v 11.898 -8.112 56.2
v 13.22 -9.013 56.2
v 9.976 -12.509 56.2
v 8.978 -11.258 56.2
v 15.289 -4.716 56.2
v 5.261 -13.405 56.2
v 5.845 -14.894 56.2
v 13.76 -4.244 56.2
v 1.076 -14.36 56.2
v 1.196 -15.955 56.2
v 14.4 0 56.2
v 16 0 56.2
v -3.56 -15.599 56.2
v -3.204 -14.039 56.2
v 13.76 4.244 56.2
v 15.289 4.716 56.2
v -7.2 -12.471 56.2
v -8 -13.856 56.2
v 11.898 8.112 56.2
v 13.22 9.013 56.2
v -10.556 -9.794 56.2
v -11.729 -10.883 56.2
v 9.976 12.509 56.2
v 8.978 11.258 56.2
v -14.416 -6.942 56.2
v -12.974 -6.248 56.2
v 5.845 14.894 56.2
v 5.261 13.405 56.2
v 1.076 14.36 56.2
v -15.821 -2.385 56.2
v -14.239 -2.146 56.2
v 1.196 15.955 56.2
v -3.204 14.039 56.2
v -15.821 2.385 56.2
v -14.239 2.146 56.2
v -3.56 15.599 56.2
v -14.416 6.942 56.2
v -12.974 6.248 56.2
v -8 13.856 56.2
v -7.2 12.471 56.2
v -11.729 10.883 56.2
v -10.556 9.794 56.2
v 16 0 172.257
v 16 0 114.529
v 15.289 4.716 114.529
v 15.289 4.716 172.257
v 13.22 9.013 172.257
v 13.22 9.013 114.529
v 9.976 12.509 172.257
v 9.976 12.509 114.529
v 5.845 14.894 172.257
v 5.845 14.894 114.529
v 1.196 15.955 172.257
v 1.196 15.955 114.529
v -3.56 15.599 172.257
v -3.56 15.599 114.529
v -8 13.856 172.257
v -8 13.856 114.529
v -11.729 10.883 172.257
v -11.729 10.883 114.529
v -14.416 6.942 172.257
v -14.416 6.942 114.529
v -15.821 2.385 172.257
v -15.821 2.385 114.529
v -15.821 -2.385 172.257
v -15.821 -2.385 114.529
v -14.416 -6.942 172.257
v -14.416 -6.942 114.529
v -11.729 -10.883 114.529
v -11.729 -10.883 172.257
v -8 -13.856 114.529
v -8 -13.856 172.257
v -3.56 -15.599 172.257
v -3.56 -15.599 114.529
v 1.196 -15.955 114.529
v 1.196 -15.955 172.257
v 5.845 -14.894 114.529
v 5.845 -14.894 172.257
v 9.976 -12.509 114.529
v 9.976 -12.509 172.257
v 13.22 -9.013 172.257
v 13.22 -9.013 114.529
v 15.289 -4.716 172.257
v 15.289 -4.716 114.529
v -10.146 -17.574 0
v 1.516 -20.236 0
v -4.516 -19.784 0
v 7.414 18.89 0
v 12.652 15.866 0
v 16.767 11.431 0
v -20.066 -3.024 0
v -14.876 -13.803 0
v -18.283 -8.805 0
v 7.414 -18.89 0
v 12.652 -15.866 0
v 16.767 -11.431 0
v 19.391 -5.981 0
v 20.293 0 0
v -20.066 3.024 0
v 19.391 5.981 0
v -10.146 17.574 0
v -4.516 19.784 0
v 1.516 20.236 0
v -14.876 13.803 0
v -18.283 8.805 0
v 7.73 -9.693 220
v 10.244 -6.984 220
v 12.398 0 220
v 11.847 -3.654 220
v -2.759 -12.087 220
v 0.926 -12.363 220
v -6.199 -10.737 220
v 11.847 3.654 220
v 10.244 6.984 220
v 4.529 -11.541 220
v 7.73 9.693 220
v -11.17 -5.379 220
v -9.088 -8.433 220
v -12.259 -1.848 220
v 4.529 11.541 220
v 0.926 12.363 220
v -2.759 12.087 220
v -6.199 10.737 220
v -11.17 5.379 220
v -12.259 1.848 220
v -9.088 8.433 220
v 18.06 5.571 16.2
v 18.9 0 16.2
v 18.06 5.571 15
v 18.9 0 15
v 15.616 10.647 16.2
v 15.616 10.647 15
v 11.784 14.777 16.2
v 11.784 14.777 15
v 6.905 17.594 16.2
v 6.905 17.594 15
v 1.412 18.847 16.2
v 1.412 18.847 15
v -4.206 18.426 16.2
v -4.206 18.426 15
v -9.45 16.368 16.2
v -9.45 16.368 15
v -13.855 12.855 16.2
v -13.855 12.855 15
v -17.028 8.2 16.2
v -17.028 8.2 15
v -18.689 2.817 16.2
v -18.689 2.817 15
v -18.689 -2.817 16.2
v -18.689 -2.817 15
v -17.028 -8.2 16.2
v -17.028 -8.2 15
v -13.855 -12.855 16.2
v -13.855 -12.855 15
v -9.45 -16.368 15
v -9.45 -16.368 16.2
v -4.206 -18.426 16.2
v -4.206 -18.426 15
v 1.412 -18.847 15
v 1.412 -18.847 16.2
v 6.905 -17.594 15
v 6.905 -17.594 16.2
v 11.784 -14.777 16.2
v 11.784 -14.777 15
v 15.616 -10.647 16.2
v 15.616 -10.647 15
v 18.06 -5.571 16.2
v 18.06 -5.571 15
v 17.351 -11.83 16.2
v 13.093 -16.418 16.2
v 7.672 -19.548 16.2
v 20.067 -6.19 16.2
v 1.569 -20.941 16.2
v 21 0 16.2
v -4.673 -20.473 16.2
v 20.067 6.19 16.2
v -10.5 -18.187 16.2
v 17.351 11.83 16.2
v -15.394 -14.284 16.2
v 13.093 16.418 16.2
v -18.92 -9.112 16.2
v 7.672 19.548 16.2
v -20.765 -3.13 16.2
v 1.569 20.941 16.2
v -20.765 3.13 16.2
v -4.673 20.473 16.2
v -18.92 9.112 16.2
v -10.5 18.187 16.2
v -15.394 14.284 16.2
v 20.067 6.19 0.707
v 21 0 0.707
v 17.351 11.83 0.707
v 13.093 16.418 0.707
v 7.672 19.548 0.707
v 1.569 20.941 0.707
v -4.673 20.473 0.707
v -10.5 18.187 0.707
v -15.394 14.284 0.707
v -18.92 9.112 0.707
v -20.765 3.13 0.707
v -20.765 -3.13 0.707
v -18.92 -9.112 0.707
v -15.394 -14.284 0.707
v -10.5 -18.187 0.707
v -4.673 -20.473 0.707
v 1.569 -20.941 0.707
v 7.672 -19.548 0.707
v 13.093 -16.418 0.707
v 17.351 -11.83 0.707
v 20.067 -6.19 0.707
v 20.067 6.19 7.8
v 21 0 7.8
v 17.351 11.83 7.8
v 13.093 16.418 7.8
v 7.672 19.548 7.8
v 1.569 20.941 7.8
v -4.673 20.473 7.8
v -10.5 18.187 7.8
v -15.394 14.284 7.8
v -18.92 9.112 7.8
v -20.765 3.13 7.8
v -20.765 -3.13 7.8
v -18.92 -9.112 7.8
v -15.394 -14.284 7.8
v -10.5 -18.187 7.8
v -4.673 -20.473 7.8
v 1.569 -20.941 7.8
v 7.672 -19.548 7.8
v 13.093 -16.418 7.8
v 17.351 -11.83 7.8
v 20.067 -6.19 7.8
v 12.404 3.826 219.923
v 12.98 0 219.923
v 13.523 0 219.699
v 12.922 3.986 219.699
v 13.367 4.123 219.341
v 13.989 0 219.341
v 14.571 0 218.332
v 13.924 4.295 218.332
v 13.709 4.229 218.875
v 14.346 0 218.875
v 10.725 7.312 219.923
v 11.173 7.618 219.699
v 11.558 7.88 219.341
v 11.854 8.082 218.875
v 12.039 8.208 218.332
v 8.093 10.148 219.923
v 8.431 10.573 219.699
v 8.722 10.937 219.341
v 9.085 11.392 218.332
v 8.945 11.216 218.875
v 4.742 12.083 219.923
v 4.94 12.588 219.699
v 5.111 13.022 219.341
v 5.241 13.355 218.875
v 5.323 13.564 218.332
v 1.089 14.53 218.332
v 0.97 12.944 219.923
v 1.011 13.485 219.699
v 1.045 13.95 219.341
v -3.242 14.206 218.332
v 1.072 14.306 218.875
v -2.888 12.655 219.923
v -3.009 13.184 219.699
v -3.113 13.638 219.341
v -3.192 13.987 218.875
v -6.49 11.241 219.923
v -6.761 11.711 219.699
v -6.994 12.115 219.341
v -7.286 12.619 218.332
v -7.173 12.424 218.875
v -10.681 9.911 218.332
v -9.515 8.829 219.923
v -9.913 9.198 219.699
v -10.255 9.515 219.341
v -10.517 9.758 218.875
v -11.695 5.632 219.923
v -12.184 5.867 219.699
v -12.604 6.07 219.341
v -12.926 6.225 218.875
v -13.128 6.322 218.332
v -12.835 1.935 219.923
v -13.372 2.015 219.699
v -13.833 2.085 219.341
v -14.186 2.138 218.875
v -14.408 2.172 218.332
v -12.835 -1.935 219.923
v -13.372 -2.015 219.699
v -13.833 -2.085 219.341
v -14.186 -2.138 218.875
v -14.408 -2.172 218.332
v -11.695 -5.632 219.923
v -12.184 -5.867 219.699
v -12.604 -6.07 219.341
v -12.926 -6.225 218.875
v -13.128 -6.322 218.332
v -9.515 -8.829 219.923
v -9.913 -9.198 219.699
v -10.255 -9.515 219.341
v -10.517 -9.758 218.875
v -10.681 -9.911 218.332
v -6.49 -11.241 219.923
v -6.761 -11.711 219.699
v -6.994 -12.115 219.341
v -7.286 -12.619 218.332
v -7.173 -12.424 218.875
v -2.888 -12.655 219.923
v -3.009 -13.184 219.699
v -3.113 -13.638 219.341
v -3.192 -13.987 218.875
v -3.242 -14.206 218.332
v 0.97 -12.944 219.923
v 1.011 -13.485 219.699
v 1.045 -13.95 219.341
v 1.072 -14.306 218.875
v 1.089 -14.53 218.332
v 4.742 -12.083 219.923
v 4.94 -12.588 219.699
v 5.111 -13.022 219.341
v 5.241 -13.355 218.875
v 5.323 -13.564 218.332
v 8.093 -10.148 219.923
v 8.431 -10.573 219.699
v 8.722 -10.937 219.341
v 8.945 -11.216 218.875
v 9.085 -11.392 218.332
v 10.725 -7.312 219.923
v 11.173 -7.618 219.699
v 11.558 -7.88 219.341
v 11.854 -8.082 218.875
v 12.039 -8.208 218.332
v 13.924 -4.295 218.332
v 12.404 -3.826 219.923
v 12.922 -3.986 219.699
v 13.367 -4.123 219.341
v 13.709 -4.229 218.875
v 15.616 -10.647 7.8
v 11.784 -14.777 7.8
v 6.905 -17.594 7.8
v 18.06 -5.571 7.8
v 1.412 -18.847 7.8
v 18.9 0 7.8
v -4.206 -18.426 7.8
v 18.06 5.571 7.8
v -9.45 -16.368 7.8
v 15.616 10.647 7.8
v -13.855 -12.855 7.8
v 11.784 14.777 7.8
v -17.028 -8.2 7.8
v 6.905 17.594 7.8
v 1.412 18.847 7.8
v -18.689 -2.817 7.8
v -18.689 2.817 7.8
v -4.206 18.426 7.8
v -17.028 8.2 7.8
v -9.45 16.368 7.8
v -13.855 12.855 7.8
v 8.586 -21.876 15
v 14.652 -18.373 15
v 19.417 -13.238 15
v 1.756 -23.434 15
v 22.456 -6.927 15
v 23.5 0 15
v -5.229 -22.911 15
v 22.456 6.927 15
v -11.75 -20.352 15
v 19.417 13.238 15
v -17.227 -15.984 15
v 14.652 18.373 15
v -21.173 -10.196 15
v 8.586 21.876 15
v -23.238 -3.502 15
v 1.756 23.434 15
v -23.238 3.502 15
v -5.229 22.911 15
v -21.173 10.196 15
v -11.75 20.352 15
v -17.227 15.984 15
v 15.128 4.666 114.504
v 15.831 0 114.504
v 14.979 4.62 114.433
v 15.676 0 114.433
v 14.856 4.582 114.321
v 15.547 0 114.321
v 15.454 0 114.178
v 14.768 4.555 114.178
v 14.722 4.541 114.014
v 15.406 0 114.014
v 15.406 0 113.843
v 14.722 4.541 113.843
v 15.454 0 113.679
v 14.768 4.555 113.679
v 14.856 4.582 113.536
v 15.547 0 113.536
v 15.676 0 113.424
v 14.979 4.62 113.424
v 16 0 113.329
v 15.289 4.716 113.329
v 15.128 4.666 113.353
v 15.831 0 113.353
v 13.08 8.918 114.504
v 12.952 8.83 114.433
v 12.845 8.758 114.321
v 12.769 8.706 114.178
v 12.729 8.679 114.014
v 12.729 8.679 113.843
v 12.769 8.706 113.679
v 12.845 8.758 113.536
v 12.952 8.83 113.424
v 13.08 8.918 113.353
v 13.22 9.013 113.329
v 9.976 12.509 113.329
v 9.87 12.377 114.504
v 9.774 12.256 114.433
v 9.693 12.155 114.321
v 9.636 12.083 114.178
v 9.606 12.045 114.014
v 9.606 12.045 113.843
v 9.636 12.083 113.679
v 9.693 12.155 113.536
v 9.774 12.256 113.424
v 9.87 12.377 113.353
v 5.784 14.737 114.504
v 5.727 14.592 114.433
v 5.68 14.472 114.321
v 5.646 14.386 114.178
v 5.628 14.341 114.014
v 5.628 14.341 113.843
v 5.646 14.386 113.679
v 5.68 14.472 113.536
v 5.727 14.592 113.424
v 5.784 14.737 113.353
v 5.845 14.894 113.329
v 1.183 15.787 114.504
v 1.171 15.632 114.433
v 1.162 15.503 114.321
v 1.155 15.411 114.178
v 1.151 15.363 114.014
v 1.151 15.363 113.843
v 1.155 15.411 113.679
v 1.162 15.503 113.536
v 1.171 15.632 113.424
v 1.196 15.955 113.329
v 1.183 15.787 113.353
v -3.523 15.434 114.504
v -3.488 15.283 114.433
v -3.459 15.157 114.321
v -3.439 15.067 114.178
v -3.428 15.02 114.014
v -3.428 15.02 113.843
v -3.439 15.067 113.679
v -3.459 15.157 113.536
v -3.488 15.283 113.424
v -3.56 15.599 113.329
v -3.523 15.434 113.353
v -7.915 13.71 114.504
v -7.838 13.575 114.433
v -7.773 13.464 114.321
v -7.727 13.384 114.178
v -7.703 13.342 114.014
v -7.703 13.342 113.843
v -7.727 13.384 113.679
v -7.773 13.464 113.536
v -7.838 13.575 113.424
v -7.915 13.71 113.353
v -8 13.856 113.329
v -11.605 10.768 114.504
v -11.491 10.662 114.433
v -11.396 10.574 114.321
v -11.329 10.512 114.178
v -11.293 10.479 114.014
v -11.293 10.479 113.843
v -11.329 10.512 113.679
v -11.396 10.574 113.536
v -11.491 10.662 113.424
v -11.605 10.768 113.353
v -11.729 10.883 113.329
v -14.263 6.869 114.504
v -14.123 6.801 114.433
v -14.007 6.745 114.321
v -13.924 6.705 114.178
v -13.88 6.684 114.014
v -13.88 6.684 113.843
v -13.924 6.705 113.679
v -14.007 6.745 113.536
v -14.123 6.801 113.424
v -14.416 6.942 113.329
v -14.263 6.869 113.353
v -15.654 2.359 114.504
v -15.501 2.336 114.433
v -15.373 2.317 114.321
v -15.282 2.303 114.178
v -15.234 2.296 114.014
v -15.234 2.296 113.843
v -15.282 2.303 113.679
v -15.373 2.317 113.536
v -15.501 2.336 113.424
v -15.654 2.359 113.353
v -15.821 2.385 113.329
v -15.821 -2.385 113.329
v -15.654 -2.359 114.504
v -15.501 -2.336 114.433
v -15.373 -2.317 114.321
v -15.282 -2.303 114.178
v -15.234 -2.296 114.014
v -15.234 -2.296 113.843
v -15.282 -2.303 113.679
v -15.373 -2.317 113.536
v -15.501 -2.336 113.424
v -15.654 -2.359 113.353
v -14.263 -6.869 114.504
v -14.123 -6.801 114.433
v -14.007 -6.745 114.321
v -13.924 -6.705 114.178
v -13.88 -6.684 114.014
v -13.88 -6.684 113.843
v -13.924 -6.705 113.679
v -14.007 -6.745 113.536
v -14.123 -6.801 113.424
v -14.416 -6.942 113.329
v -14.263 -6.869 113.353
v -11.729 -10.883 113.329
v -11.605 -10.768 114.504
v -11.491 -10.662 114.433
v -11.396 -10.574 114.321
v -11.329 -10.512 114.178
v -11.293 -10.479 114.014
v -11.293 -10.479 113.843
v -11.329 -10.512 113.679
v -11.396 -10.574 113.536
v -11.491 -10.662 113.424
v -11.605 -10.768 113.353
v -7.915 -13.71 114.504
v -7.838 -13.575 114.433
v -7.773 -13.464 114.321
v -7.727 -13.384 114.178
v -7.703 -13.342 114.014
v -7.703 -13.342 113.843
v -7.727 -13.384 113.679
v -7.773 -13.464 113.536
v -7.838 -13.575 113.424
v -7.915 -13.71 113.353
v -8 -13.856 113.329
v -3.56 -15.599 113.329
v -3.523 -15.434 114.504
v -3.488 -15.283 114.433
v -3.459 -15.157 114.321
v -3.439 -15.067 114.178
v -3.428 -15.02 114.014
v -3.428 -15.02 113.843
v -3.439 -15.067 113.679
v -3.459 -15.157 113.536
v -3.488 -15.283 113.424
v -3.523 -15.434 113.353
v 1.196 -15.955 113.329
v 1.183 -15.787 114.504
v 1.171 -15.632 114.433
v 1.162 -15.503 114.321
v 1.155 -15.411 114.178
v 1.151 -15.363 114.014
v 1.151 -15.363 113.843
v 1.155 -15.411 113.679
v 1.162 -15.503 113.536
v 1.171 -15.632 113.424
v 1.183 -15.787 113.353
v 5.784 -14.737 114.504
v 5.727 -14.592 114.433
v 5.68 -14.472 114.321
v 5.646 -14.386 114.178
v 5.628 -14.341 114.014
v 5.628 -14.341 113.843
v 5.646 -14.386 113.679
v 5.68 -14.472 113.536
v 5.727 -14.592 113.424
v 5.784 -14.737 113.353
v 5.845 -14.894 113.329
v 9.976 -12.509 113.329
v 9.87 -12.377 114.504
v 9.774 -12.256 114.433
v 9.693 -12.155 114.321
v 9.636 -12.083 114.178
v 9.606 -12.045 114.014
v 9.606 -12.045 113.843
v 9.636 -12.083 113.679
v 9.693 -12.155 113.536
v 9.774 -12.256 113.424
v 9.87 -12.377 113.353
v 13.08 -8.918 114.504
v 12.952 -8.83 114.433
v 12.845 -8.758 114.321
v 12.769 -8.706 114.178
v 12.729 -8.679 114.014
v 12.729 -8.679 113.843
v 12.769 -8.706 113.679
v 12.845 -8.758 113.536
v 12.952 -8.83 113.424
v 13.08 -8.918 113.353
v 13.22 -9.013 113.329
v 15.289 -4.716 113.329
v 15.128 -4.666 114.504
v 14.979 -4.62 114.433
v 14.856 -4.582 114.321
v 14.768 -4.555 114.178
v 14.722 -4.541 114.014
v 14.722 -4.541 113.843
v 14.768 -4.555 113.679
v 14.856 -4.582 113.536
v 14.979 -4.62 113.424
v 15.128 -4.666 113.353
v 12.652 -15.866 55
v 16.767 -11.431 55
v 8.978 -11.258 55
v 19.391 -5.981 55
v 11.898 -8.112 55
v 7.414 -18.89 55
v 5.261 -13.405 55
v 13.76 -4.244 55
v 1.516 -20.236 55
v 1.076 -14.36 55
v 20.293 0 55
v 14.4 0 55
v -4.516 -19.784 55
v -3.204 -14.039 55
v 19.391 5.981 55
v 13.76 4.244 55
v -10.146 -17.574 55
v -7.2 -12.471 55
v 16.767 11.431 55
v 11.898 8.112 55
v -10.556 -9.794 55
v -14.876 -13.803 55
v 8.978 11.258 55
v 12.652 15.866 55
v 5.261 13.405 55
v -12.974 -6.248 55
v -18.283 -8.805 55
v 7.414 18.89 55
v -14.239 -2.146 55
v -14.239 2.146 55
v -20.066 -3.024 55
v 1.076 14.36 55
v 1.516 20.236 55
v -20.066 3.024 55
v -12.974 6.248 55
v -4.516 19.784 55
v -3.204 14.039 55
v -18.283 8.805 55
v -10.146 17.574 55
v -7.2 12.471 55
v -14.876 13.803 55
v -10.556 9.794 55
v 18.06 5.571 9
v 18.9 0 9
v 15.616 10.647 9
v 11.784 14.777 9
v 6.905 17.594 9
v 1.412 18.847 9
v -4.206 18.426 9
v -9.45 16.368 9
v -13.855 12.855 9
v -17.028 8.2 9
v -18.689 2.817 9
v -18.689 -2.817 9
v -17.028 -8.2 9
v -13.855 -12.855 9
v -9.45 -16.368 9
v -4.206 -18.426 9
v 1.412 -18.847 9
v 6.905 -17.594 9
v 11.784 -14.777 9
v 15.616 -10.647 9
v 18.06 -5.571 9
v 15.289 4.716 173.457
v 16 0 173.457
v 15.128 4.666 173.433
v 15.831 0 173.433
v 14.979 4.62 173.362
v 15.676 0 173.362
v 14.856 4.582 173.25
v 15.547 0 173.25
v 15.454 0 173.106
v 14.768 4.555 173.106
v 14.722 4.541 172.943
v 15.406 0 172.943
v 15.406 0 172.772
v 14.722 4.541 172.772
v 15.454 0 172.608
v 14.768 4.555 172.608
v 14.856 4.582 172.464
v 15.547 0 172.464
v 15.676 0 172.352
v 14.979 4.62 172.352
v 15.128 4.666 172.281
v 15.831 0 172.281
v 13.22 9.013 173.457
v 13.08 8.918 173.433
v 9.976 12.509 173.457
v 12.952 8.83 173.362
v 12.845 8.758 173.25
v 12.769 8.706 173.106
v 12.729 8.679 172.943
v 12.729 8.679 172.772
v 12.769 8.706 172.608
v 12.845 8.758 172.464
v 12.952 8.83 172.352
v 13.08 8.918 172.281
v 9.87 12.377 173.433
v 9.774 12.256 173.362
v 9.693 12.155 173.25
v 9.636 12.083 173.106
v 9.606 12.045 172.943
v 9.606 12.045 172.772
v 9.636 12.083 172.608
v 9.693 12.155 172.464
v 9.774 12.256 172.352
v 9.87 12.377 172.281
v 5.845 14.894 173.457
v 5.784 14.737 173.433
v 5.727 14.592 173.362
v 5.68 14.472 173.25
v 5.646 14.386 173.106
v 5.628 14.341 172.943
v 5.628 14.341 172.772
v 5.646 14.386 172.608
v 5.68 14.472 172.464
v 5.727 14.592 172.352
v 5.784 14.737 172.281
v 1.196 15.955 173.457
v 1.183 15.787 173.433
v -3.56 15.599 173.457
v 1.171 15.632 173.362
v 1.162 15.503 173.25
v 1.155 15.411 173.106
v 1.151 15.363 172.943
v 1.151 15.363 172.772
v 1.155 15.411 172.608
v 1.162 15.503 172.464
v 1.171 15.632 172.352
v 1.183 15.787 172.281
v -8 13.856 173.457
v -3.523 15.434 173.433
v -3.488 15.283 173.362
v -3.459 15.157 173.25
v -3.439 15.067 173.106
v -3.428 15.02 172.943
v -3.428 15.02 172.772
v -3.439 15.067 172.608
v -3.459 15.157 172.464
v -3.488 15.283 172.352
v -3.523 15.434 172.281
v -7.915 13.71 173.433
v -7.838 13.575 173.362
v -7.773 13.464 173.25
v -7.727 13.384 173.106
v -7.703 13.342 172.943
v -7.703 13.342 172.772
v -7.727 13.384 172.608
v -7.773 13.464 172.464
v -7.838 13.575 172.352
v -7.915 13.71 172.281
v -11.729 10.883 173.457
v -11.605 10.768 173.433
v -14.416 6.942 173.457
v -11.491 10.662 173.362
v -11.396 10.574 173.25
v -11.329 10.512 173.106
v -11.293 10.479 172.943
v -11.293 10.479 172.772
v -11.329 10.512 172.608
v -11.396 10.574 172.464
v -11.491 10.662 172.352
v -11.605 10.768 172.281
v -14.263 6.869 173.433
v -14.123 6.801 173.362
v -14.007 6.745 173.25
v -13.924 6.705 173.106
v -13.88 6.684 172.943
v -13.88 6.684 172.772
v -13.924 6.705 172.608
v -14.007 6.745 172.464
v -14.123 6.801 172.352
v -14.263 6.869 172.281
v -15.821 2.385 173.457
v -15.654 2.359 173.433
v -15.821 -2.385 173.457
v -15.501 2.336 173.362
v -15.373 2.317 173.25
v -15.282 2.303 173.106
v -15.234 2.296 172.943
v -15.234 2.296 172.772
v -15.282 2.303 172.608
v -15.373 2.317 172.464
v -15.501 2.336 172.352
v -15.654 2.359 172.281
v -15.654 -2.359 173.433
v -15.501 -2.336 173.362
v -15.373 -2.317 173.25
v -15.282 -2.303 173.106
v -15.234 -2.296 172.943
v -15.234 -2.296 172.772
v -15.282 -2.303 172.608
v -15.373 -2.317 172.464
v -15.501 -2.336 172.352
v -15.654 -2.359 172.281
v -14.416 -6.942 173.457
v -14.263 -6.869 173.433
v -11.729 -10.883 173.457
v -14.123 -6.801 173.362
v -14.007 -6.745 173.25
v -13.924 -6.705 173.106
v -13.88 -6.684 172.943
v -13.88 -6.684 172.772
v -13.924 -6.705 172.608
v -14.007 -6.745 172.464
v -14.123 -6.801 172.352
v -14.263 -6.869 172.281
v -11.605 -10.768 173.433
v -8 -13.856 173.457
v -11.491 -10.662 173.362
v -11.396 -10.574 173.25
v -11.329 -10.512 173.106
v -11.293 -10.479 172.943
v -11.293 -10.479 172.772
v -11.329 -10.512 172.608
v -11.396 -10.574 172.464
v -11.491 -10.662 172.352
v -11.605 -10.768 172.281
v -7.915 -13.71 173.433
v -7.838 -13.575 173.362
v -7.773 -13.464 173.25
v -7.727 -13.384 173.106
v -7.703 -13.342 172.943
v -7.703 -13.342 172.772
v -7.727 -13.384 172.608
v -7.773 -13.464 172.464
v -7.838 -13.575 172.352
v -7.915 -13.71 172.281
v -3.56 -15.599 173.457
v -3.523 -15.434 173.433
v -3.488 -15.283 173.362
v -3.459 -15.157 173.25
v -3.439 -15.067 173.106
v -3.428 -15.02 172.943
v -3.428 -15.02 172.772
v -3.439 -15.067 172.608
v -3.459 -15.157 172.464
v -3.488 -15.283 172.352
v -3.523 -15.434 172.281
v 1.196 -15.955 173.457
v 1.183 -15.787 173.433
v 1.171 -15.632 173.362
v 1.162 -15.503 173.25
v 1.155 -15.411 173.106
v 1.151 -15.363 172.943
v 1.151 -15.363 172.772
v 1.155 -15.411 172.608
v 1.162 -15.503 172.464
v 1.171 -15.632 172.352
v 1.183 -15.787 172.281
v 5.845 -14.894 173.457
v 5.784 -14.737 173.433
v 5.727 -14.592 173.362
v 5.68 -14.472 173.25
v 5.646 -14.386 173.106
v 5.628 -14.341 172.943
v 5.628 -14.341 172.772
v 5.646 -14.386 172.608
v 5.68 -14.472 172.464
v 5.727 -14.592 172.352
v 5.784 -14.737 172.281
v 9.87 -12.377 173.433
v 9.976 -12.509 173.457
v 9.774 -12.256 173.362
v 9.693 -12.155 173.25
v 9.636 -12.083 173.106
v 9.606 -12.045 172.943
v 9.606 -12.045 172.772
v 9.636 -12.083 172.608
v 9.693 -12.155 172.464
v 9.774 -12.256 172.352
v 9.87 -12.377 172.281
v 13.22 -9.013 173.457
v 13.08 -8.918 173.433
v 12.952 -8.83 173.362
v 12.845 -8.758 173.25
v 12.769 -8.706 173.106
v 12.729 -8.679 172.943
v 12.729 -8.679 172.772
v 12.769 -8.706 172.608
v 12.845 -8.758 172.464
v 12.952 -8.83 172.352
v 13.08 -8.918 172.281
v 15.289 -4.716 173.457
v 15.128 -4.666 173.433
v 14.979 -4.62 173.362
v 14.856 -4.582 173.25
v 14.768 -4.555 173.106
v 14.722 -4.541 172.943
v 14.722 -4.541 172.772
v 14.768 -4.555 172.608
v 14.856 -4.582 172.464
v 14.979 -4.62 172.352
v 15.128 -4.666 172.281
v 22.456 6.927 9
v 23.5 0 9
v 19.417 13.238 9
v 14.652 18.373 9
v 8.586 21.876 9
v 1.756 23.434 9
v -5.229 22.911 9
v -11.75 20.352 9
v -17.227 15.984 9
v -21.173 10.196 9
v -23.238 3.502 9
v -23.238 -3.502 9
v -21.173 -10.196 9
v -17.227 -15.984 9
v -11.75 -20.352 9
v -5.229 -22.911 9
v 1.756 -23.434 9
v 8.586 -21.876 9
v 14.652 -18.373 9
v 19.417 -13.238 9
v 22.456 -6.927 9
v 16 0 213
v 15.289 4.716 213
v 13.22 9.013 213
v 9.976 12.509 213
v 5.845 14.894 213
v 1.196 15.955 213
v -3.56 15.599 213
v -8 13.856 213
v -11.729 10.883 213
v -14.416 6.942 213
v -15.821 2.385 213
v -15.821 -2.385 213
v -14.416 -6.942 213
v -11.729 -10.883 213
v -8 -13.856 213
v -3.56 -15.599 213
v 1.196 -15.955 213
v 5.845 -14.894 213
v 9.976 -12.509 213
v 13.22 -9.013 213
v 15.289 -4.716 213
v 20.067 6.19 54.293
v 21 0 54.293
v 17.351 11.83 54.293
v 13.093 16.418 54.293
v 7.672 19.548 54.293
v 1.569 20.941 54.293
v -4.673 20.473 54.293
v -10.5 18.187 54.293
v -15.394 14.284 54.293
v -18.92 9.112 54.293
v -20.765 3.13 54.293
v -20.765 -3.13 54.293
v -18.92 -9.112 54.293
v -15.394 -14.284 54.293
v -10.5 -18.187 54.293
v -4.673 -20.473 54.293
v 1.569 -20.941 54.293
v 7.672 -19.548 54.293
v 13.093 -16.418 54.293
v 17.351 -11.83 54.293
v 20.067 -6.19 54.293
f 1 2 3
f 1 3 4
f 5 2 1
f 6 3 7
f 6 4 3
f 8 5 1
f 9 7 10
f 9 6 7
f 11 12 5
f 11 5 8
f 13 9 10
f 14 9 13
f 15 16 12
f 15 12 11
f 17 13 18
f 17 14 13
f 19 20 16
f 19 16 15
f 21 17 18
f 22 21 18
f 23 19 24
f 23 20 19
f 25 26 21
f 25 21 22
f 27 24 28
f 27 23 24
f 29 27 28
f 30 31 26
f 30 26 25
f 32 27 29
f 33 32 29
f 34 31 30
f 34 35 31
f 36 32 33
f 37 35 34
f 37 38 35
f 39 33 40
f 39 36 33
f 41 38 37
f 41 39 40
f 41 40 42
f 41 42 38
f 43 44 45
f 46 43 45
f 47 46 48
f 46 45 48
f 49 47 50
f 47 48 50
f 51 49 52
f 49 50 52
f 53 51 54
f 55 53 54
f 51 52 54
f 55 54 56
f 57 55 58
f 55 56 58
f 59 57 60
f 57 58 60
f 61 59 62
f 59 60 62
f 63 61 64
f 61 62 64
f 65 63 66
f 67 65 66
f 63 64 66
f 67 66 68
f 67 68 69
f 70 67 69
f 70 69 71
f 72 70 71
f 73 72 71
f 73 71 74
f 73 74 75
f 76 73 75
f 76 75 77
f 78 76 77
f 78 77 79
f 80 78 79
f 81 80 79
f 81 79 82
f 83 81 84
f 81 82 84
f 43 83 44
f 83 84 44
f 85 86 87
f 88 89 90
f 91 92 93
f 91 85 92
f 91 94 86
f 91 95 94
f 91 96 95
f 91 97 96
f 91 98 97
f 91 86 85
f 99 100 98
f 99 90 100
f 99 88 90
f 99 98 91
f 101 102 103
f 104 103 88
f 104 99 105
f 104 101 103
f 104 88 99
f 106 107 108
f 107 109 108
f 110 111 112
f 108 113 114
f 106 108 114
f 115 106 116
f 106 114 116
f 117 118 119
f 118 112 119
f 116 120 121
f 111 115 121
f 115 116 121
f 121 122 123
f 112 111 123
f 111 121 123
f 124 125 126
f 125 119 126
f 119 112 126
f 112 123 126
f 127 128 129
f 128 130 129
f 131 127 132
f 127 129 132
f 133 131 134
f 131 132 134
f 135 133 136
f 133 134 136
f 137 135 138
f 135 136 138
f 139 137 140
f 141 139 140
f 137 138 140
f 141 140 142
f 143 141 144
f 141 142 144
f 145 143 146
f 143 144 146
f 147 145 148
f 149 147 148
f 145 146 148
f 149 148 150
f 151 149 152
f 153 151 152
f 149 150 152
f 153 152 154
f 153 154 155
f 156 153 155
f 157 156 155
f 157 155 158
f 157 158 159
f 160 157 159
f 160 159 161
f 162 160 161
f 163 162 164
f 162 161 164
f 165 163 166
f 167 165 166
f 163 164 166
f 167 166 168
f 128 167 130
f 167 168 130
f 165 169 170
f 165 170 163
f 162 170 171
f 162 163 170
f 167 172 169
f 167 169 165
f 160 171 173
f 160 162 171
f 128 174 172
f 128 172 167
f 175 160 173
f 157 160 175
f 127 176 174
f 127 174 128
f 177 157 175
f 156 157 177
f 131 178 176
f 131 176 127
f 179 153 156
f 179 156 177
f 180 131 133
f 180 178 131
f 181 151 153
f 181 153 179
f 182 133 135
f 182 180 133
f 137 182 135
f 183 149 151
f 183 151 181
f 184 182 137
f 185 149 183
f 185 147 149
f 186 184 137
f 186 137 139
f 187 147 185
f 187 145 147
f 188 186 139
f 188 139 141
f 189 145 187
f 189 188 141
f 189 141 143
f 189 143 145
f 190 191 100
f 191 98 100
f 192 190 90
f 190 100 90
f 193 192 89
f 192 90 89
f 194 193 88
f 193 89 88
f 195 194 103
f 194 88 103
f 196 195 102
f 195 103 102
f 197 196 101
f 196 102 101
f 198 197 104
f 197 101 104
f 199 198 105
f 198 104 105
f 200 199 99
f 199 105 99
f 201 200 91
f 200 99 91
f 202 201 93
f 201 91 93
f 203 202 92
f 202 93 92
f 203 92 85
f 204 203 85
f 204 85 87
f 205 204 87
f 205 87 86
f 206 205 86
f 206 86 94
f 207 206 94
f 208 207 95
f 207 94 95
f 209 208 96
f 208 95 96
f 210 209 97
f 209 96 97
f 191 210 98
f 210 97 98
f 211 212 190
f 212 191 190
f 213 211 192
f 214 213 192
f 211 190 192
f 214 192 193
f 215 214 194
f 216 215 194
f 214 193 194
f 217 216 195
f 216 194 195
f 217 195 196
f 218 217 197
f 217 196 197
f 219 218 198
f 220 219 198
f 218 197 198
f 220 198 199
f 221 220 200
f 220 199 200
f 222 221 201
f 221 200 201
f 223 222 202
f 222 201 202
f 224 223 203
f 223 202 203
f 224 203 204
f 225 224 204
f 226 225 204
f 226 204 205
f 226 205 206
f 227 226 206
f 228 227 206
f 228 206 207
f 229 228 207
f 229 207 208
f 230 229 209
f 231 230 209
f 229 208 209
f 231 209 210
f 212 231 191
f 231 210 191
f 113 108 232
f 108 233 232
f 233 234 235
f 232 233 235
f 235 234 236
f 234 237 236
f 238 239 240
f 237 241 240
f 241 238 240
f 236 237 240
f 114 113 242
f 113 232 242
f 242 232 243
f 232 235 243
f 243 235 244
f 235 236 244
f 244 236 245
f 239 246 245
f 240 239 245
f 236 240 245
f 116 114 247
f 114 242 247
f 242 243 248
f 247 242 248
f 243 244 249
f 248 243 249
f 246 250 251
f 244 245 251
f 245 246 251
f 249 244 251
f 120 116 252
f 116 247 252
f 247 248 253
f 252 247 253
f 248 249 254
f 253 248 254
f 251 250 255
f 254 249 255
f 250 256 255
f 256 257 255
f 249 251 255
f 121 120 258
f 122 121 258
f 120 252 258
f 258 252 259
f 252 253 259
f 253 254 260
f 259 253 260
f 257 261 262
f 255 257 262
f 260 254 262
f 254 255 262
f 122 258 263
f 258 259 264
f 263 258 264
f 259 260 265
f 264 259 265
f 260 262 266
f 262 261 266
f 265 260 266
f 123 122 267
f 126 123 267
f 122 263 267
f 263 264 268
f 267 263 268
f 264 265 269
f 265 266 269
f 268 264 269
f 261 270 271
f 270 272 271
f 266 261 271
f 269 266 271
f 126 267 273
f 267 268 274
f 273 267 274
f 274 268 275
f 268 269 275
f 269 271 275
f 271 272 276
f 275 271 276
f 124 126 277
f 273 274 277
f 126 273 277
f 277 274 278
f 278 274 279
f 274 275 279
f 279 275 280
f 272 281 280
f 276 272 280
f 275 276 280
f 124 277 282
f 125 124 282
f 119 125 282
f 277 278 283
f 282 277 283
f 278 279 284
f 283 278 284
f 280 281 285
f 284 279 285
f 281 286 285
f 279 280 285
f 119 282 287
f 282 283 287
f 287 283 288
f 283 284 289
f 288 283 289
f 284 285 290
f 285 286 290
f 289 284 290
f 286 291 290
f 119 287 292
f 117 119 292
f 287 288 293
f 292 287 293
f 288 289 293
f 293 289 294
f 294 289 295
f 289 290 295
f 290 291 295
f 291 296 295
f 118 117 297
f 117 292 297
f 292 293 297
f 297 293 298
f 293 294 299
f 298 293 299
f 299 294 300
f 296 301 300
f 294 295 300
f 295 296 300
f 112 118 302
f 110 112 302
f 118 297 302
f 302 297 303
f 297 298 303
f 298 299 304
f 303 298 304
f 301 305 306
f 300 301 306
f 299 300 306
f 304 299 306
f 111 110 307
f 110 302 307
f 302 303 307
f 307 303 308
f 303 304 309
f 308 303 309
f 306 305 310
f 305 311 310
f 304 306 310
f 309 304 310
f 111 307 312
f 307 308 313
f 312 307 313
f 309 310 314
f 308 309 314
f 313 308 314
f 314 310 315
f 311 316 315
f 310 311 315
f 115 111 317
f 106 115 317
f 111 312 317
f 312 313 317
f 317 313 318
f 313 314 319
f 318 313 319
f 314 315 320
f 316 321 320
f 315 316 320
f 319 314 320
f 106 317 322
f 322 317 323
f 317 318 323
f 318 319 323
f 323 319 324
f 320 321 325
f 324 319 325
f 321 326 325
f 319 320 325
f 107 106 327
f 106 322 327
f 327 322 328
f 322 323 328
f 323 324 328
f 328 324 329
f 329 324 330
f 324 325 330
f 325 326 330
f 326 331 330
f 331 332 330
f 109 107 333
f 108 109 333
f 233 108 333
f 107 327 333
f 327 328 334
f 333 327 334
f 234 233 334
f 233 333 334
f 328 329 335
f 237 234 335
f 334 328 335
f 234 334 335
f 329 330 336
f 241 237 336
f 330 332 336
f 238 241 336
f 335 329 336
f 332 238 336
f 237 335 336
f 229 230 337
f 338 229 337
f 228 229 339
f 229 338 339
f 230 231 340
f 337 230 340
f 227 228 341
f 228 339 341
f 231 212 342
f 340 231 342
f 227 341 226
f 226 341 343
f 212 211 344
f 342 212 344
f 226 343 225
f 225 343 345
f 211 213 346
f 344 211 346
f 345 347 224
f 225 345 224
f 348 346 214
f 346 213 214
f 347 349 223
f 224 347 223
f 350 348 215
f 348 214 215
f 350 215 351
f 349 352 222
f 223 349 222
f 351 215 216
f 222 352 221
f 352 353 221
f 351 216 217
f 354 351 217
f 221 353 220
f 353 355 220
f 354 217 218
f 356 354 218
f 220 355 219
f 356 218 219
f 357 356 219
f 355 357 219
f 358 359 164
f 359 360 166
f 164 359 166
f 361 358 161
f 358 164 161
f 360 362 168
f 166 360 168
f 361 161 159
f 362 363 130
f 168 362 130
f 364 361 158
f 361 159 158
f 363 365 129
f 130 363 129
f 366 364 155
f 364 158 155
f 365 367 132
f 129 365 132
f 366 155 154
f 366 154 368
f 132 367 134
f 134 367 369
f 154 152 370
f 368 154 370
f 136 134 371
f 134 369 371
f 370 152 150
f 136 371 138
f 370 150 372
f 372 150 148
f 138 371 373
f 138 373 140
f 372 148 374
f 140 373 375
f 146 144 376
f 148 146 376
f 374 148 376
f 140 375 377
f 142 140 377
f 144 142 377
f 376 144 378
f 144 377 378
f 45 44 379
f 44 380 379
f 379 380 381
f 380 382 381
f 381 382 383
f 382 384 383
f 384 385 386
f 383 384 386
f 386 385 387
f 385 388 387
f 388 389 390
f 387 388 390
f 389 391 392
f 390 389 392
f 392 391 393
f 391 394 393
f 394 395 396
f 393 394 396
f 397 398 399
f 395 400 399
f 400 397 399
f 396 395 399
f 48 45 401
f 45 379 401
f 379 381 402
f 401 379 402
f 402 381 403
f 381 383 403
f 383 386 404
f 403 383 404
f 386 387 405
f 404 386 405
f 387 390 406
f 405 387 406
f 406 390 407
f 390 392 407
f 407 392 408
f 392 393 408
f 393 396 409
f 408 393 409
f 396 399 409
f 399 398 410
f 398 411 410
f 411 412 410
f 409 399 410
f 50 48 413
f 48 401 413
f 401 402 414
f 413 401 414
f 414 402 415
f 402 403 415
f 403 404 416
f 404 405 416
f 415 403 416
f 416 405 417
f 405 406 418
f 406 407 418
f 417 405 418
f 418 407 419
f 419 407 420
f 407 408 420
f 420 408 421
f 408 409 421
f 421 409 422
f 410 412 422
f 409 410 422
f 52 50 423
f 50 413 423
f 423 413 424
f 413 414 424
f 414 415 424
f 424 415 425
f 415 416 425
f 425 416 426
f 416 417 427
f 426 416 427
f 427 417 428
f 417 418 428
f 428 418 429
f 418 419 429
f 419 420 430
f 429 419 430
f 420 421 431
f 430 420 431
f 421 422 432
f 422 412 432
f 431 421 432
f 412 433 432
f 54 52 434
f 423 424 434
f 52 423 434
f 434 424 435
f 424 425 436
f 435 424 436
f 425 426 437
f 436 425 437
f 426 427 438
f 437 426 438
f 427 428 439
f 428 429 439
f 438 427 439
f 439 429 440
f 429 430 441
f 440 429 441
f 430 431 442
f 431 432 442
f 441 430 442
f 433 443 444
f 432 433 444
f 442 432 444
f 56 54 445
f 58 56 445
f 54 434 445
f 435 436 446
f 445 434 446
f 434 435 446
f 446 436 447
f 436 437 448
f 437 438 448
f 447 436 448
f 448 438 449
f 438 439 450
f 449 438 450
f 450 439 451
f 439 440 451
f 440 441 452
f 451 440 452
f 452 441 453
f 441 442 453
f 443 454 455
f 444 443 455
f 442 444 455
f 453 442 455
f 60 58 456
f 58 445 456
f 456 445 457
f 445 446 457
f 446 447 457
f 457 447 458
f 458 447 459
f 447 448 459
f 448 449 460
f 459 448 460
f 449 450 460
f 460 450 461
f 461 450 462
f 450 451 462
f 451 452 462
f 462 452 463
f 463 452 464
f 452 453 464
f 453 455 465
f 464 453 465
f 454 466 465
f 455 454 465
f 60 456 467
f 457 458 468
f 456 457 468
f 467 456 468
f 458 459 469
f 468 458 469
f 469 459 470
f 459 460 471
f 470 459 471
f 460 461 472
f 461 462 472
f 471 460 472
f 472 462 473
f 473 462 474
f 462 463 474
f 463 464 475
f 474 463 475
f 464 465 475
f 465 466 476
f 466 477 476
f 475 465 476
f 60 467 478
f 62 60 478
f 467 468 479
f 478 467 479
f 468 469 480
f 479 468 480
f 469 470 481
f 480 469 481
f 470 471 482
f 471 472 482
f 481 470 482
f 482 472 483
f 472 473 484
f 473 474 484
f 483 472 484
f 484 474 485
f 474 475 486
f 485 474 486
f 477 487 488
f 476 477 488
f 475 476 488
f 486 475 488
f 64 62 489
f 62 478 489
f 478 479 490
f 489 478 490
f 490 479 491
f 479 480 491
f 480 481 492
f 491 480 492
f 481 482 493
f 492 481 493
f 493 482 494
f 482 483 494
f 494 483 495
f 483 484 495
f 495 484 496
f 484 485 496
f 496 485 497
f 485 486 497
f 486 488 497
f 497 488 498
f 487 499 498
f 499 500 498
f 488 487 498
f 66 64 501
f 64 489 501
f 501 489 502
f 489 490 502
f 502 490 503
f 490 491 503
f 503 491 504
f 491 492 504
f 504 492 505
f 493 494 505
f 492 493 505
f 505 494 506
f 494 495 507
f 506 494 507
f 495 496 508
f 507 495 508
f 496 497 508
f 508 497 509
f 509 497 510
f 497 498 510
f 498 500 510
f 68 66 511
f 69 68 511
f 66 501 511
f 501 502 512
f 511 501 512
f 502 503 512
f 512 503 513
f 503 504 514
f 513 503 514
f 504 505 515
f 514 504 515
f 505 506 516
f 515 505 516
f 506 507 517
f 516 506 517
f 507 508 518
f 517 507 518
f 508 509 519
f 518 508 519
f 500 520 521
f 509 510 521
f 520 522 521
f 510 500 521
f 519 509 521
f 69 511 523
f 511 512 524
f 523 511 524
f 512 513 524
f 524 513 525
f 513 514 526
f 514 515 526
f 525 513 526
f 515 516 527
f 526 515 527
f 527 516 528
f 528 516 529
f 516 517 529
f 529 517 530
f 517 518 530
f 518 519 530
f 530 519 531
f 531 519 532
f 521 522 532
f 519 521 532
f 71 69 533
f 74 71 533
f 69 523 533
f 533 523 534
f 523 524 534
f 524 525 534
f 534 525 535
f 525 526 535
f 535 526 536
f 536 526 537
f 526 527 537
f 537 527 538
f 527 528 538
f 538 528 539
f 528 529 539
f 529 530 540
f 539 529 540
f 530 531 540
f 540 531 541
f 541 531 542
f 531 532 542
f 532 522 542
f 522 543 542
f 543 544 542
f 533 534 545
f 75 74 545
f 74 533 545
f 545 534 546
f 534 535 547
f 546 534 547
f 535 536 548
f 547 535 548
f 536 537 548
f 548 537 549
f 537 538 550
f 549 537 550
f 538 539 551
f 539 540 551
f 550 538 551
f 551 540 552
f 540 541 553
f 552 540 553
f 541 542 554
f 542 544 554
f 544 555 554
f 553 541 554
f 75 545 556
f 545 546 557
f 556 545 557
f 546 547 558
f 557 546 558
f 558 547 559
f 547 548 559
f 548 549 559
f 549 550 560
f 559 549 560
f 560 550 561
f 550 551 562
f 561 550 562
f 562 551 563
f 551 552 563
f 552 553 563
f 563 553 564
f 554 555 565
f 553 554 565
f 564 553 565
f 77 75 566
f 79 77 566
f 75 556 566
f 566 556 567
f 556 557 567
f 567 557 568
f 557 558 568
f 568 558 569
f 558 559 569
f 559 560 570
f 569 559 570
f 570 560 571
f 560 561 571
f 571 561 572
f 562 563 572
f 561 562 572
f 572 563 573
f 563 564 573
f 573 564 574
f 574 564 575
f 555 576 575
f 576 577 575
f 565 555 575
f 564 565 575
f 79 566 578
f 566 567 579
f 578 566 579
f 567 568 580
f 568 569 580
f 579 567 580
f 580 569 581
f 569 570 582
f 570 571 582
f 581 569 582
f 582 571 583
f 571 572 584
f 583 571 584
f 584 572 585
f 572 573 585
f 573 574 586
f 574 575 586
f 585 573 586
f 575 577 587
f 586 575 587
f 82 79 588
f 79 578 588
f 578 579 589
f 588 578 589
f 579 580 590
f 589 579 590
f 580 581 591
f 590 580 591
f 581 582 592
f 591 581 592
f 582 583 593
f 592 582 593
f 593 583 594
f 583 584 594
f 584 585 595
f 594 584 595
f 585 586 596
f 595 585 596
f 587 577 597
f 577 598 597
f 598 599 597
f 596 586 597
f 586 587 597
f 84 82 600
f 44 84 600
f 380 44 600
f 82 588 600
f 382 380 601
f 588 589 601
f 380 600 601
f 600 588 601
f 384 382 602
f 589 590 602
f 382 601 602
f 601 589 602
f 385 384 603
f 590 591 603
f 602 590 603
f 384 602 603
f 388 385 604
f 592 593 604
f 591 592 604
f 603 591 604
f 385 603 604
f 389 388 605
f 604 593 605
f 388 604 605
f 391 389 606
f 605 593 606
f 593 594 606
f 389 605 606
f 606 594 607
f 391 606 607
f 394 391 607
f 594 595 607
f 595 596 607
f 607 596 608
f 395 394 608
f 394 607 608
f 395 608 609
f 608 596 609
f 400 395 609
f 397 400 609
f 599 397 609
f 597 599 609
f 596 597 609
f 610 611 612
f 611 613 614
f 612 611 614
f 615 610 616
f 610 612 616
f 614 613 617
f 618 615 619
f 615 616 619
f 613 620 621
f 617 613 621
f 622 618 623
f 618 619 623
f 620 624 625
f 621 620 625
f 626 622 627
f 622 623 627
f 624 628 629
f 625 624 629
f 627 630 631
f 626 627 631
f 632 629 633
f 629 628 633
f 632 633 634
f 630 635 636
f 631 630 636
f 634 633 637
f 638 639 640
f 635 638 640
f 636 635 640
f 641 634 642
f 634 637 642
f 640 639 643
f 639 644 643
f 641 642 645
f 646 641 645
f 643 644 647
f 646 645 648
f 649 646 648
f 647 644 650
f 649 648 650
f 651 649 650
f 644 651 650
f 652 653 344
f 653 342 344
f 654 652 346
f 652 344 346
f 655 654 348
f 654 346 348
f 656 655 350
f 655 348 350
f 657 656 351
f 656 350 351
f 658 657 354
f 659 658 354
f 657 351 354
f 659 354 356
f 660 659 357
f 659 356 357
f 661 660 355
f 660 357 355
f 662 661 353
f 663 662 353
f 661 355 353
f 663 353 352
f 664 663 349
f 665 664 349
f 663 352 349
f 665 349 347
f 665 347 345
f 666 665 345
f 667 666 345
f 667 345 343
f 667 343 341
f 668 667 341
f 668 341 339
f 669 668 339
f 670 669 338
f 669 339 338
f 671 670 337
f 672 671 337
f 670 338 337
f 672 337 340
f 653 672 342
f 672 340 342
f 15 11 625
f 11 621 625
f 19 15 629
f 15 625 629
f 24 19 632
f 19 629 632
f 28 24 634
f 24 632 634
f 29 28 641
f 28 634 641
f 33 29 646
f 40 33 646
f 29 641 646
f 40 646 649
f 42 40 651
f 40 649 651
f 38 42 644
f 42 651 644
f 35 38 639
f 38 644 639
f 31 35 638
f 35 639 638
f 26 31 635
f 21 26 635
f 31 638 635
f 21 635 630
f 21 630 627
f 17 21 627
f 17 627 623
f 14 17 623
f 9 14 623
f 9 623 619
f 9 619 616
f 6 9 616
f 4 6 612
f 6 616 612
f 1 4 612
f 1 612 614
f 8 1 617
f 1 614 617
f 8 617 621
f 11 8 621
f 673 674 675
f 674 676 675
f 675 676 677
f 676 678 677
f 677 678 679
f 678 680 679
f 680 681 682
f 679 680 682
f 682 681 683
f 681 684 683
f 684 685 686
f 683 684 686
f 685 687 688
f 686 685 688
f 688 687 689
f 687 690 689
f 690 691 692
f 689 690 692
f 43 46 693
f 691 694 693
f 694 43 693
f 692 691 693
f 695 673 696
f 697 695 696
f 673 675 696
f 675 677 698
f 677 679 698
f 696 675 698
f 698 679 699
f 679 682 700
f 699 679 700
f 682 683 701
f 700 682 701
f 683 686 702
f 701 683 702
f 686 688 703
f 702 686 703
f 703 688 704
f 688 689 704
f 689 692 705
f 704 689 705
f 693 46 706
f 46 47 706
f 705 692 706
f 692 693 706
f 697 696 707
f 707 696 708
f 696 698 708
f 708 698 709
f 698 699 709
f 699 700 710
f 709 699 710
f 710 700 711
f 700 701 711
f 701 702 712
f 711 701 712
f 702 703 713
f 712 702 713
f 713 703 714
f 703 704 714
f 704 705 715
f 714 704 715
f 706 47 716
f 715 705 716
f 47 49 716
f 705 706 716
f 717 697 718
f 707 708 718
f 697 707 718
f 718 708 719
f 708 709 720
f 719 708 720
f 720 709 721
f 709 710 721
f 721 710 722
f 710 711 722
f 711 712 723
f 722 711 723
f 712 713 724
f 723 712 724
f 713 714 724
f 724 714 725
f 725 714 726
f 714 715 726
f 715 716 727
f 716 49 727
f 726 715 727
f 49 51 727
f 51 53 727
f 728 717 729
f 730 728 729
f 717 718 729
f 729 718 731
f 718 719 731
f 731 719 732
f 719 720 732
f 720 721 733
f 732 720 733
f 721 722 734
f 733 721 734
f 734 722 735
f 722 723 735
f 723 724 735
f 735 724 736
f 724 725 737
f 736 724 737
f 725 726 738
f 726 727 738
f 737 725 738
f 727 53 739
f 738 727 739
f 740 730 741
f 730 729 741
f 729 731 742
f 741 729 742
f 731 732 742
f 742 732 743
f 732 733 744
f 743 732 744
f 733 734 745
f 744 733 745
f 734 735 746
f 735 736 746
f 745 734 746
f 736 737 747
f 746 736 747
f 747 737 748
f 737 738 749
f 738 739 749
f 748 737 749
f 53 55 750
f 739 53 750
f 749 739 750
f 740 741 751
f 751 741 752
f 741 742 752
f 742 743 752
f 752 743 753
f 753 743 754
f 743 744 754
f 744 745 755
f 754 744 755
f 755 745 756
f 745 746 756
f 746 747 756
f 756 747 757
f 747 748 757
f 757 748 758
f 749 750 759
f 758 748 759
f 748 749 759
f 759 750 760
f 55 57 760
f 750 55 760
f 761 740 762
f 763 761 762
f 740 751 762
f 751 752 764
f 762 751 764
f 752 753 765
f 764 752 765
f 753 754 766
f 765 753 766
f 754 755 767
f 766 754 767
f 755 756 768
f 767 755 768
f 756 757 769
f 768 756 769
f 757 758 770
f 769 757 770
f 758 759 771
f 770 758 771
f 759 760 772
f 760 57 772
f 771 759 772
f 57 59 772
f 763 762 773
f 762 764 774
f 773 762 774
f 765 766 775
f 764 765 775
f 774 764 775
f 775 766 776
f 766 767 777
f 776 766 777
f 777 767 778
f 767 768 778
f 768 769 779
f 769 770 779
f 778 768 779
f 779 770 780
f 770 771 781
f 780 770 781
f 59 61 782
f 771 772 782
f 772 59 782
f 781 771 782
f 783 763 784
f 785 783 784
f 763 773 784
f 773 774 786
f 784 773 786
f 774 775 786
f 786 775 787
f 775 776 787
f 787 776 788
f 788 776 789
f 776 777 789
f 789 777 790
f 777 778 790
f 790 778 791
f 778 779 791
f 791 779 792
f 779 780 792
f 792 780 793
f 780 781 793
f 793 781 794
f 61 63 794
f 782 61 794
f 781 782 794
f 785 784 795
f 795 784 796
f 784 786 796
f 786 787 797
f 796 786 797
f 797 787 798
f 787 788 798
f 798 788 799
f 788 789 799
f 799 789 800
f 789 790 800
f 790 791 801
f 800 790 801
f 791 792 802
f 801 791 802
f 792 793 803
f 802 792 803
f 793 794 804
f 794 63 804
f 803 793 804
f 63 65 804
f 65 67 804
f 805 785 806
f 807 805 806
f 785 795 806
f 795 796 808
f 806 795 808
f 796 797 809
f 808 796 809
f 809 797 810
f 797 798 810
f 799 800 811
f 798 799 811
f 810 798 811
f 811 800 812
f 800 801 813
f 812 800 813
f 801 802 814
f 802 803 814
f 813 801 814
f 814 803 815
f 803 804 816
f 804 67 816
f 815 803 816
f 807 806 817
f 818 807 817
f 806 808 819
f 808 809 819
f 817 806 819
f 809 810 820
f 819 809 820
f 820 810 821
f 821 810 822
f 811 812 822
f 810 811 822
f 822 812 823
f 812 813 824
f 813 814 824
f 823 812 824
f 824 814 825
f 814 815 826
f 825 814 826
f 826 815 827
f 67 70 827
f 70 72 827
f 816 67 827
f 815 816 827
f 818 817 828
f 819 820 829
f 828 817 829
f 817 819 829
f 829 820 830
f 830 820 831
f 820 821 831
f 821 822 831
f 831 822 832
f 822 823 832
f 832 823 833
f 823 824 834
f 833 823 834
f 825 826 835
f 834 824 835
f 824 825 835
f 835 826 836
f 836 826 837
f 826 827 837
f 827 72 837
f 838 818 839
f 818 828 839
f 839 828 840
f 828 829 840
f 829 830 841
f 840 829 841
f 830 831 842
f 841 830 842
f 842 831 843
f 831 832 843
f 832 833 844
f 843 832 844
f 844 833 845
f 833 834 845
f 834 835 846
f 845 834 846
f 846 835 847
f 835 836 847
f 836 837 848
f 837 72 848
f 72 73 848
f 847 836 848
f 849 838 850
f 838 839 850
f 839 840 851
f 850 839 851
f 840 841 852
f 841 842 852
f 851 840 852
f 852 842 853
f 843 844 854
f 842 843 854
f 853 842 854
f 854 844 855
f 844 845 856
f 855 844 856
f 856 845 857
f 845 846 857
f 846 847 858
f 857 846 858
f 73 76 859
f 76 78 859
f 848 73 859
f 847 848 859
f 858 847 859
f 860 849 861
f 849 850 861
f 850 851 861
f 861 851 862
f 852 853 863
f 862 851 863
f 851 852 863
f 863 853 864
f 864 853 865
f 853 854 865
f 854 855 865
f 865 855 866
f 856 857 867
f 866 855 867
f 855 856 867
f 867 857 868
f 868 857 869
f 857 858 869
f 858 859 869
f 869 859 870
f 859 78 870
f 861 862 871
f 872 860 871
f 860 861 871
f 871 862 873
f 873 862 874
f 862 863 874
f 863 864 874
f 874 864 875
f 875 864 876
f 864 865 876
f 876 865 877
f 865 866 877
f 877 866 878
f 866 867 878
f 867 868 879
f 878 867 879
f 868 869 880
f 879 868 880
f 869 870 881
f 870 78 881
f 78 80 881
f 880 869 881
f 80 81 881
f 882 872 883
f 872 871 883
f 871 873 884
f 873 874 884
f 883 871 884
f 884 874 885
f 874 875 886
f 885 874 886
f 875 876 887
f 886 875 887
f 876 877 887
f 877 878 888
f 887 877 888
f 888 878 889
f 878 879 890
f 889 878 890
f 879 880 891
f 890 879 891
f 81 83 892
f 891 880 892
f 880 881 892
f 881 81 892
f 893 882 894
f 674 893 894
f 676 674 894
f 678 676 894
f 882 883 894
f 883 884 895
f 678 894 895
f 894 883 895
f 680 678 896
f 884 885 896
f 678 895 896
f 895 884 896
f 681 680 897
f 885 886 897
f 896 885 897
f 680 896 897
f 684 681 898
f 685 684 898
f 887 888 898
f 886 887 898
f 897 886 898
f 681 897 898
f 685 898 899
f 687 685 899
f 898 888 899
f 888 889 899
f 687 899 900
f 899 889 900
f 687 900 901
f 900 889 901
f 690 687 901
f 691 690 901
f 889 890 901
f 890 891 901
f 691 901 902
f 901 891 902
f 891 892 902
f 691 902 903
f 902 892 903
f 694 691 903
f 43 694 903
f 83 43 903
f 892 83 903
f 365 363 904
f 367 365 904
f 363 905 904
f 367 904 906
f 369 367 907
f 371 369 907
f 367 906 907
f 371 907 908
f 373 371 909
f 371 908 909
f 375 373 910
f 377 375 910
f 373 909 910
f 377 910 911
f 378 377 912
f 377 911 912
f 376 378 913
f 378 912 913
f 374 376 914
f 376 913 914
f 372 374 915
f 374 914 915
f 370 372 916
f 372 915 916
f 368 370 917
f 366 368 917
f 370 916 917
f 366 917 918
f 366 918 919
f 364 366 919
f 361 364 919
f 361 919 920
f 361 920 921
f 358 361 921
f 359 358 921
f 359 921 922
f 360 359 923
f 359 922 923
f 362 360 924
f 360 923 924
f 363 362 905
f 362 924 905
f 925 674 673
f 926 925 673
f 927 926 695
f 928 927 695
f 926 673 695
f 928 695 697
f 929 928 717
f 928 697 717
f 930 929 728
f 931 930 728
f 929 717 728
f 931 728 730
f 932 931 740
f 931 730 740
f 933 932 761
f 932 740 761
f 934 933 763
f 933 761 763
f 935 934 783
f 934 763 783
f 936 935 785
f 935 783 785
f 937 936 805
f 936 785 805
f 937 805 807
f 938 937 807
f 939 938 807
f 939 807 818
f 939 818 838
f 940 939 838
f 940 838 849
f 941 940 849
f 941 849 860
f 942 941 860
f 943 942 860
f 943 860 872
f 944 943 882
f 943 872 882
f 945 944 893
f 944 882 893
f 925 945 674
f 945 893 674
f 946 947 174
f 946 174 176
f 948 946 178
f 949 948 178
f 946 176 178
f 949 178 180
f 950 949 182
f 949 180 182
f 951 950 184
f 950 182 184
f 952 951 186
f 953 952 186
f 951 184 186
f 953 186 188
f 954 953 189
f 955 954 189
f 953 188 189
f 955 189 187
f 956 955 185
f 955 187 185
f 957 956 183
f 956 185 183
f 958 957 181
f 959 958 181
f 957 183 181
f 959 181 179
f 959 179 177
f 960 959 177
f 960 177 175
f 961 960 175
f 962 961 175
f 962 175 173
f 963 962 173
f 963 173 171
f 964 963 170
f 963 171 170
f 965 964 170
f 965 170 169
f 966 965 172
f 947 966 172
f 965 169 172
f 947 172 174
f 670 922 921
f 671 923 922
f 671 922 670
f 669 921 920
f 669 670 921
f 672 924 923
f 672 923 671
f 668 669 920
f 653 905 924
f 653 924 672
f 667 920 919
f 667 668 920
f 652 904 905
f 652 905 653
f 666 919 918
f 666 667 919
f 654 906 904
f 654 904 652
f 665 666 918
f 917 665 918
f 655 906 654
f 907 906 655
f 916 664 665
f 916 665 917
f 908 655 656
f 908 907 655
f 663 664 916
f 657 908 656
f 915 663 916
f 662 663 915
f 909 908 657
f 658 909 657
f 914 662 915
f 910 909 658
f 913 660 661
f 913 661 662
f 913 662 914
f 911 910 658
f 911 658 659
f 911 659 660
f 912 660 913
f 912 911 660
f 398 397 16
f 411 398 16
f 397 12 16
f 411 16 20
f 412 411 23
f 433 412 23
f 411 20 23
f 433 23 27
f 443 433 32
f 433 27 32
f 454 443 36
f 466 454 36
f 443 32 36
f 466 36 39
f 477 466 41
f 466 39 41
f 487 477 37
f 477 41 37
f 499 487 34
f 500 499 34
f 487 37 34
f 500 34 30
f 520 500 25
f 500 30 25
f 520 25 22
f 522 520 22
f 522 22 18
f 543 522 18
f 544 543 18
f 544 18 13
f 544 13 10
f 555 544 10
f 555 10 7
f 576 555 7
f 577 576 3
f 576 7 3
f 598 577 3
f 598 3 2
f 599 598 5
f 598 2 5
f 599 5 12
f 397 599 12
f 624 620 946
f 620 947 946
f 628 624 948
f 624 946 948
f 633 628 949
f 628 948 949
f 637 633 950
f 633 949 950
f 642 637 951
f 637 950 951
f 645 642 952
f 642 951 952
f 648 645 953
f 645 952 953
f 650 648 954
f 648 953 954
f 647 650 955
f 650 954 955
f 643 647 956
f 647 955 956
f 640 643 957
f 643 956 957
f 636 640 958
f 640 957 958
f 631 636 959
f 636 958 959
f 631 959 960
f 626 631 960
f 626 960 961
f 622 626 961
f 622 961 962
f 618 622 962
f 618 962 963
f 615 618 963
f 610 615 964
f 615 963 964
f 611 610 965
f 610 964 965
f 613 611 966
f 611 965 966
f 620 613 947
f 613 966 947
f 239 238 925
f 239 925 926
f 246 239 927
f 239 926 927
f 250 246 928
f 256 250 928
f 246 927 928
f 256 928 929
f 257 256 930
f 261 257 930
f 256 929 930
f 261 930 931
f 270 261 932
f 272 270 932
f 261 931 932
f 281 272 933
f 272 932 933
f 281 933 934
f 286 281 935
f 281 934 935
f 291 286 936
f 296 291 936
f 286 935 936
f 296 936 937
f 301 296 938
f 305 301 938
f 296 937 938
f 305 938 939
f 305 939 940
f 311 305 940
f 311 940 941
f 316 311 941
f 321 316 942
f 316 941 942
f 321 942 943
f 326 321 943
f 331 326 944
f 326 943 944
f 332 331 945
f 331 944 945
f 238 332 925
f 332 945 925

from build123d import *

# Parameters (mm, degrees)
SZKIC1_W = 9
SZKIC1_H = 21
SZKIC3_W = 1.2
SZKIC3_H = 2.1
SZKIC4_W = 6
SZKIC4_H = 23.5
SZKIC5_W = 40
SZKIC5_H = 21
SZKIC6_W = 1.2
SZKIC6_H = 2.1
SZKIC8_W = 165
SZKIC8_H = 16
SZKIC9_W = 1.2
SZKIC9_H = 1.6


with BuildPart() as part:
    # Szkic1 → Obrót1 (revolve)
    with BuildSketch(Plane(origin=(0, 0, 0), x_dir=(0, 0, -1), z_dir=(1, 0, 0))):
        with Locations((-4.5, 10.5)):
            Rectangle(SZKIC1_W, SZKIC1_H)
    revolve(axis=Axis((0, 0, 0), (0, 0, 1)))

    # Szkic2 → Wycięcie-obrót1 (revolve, cut)
    with BuildSketch(Plane(origin=(0, 0, 0), x_dir=(0, 0, -1), z_dir=(1, 0, 0))):
        Polygon((-0.707106781, 21), (0, 20.292893219), (0, 21), align=None)
    revolve(axis=Axis((0, 0, 0), (0, 0, 1)), mode=Mode.SUBTRACT)

    # Szkic3 → Wycięcie-obrót2 (revolve, cut)
    with BuildSketch(Plane(origin=(0, 0, 0), x_dir=(0, 0, -1), z_dir=(1, 0, 0))):
        with Locations((-8.4, 19.95)):
            Rectangle(SZKIC3_W, SZKIC3_H)
    revolve(axis=Axis((0, 0, 0), (0, 0, 1)), mode=Mode.SUBTRACT)

    # Szkic4 → Obrót2 (revolve)
    with BuildSketch(Plane(origin=(0, 0, 0), x_dir=(0, 0, -1), z_dir=(1, 0, 0))):
        with Locations((-12, 11.75)):
            Rectangle(SZKIC4_W, SZKIC4_H)
    revolve(axis=Axis((0, 0, 9), (0, 0, 1)))

    # Szkic5 → Obrót3 (revolve)
    with BuildSketch(Plane(origin=(0, 0, 0), x_dir=(0, 0, -1), z_dir=(1, 0, 0))):
        with Locations((-35, 10.5)):
            Rectangle(SZKIC5_W, SZKIC5_H)
    revolve(axis=Axis((0, 0, 15), (0, 0, 1)))

    # Szkic6 → Wycięcie-obrót3 (revolve, cut)
    with BuildSketch(Plane(origin=(0, 0, 0), x_dir=(0, 0, -1), z_dir=(1, 0, 0))):
        with Locations((-15.6, 19.95)):
            Rectangle(SZKIC6_W, SZKIC6_H)
    revolve(axis=Axis((0, 0, 15), (0, 0, 1)), mode=Mode.SUBTRACT)

    # Szkic7 → Wycięcie-obrót4 (revolve, cut)
    with BuildSketch(Plane(origin=(0, 0, 0), x_dir=(0, 0, -1), z_dir=(1, 0, 0))):
        Polygon((-55, 20.292893219), (-54.292893219, 21), (-55, 21), align=None)
    revolve(axis=Axis((0, 0, 9), (0, 0, 1)), mode=Mode.SUBTRACT)

    # Szkic8 → Obrót4 (revolve)
    with BuildSketch(Plane(origin=(0, 0, 0), x_dir=(0, 0, -1), z_dir=(1, 0, 0))):
        with Locations((-137.5, 8)):
            Rectangle(SZKIC8_W, SZKIC8_H)
    revolve(axis=Axis((0, 0, 55), (0, 0, 1)))

    # Szkic9 → Wycięcie-obrót5 (revolve, cut)
    with BuildSketch(Plane(origin=(0, 0, 0), x_dir=(0, 0, -1), z_dir=(1, 0, 0))):
        with Locations((-55.6, 15.2)):
            Rectangle(SZKIC9_W, SZKIC9_H)
    revolve(axis=Axis((0, 0, 55), (0, 0, 1)), mode=Mode.SUBTRACT)

    # Szkic10 → Wycięcie-obrót6 (revolve, cut)
    with BuildSketch(Plane(origin=(0, 0, 0), x_dir=(0, 0, -1), z_dir=(1, 0, 0))):
        Polygon((-220, 14.124355653), (-213, 16), (-220, 16), align=None)
    revolve(axis=Axis((0, 0, 55), (0, 0, 1)), mode=Mode.SUBTRACT)

    # Szkic11 → Wycięcie-obrót7 (revolve, cut)
    with BuildSketch(Plane(origin=(0, 0, 0), x_dir=(0, 0, -1), z_dir=(1, 0, 0))):
        with BuildLine():
            Line((-218.332342851, 14.571203039), (-220, 14.124355653))
            Line((-220, 14.124355653), (-220, 12.39786993))
            ThreePointArc((-220, 12.39786993), (-219.535045016, 13.767583145), (-218.332342851, 14.571203039))
        make_face()
    revolve(axis=Axis((0, 0, 55), (0, 0, 1)), mode=Mode.SUBTRACT)

    # Szkic12 → Wycięcie-obrót8 (revolve, cut)
    with BuildSketch(Plane(origin=(0, 0, 0), x_dir=(0, 0, -1), z_dir=(1, 0, 0))):
        with BuildLine():
            Line((-172.257142857, 16), (-173.457142857, 16))
            ThreePointArc((-173.457142857, 16), (-172.857142857, 15.4), (-172.257142857, 16))
        make_face()
    revolve(axis=Axis((0, 0, 172.257142857), (0, 0, 1)), mode=Mode.SUBTRACT)

    # Szkic13 → Wycięcie-obrót9 (revolve, cut)
    with BuildSketch(Plane(origin=(0, 0, 0), x_dir=(0, 0, -1), z_dir=(1, 0, 0))):
        with BuildLine():
            Line((-113.328570957, 16), (-114.528570957, 16))
            ThreePointArc((-114.528570957, 16), (-113.928570957, 15.4), (-113.328570957, 16))
        make_face()
    revolve(axis=Axis((0, 0, 113.328570957), (0, 0, 1)), mode=Mode.SUBTRACT)


solid = part.part
